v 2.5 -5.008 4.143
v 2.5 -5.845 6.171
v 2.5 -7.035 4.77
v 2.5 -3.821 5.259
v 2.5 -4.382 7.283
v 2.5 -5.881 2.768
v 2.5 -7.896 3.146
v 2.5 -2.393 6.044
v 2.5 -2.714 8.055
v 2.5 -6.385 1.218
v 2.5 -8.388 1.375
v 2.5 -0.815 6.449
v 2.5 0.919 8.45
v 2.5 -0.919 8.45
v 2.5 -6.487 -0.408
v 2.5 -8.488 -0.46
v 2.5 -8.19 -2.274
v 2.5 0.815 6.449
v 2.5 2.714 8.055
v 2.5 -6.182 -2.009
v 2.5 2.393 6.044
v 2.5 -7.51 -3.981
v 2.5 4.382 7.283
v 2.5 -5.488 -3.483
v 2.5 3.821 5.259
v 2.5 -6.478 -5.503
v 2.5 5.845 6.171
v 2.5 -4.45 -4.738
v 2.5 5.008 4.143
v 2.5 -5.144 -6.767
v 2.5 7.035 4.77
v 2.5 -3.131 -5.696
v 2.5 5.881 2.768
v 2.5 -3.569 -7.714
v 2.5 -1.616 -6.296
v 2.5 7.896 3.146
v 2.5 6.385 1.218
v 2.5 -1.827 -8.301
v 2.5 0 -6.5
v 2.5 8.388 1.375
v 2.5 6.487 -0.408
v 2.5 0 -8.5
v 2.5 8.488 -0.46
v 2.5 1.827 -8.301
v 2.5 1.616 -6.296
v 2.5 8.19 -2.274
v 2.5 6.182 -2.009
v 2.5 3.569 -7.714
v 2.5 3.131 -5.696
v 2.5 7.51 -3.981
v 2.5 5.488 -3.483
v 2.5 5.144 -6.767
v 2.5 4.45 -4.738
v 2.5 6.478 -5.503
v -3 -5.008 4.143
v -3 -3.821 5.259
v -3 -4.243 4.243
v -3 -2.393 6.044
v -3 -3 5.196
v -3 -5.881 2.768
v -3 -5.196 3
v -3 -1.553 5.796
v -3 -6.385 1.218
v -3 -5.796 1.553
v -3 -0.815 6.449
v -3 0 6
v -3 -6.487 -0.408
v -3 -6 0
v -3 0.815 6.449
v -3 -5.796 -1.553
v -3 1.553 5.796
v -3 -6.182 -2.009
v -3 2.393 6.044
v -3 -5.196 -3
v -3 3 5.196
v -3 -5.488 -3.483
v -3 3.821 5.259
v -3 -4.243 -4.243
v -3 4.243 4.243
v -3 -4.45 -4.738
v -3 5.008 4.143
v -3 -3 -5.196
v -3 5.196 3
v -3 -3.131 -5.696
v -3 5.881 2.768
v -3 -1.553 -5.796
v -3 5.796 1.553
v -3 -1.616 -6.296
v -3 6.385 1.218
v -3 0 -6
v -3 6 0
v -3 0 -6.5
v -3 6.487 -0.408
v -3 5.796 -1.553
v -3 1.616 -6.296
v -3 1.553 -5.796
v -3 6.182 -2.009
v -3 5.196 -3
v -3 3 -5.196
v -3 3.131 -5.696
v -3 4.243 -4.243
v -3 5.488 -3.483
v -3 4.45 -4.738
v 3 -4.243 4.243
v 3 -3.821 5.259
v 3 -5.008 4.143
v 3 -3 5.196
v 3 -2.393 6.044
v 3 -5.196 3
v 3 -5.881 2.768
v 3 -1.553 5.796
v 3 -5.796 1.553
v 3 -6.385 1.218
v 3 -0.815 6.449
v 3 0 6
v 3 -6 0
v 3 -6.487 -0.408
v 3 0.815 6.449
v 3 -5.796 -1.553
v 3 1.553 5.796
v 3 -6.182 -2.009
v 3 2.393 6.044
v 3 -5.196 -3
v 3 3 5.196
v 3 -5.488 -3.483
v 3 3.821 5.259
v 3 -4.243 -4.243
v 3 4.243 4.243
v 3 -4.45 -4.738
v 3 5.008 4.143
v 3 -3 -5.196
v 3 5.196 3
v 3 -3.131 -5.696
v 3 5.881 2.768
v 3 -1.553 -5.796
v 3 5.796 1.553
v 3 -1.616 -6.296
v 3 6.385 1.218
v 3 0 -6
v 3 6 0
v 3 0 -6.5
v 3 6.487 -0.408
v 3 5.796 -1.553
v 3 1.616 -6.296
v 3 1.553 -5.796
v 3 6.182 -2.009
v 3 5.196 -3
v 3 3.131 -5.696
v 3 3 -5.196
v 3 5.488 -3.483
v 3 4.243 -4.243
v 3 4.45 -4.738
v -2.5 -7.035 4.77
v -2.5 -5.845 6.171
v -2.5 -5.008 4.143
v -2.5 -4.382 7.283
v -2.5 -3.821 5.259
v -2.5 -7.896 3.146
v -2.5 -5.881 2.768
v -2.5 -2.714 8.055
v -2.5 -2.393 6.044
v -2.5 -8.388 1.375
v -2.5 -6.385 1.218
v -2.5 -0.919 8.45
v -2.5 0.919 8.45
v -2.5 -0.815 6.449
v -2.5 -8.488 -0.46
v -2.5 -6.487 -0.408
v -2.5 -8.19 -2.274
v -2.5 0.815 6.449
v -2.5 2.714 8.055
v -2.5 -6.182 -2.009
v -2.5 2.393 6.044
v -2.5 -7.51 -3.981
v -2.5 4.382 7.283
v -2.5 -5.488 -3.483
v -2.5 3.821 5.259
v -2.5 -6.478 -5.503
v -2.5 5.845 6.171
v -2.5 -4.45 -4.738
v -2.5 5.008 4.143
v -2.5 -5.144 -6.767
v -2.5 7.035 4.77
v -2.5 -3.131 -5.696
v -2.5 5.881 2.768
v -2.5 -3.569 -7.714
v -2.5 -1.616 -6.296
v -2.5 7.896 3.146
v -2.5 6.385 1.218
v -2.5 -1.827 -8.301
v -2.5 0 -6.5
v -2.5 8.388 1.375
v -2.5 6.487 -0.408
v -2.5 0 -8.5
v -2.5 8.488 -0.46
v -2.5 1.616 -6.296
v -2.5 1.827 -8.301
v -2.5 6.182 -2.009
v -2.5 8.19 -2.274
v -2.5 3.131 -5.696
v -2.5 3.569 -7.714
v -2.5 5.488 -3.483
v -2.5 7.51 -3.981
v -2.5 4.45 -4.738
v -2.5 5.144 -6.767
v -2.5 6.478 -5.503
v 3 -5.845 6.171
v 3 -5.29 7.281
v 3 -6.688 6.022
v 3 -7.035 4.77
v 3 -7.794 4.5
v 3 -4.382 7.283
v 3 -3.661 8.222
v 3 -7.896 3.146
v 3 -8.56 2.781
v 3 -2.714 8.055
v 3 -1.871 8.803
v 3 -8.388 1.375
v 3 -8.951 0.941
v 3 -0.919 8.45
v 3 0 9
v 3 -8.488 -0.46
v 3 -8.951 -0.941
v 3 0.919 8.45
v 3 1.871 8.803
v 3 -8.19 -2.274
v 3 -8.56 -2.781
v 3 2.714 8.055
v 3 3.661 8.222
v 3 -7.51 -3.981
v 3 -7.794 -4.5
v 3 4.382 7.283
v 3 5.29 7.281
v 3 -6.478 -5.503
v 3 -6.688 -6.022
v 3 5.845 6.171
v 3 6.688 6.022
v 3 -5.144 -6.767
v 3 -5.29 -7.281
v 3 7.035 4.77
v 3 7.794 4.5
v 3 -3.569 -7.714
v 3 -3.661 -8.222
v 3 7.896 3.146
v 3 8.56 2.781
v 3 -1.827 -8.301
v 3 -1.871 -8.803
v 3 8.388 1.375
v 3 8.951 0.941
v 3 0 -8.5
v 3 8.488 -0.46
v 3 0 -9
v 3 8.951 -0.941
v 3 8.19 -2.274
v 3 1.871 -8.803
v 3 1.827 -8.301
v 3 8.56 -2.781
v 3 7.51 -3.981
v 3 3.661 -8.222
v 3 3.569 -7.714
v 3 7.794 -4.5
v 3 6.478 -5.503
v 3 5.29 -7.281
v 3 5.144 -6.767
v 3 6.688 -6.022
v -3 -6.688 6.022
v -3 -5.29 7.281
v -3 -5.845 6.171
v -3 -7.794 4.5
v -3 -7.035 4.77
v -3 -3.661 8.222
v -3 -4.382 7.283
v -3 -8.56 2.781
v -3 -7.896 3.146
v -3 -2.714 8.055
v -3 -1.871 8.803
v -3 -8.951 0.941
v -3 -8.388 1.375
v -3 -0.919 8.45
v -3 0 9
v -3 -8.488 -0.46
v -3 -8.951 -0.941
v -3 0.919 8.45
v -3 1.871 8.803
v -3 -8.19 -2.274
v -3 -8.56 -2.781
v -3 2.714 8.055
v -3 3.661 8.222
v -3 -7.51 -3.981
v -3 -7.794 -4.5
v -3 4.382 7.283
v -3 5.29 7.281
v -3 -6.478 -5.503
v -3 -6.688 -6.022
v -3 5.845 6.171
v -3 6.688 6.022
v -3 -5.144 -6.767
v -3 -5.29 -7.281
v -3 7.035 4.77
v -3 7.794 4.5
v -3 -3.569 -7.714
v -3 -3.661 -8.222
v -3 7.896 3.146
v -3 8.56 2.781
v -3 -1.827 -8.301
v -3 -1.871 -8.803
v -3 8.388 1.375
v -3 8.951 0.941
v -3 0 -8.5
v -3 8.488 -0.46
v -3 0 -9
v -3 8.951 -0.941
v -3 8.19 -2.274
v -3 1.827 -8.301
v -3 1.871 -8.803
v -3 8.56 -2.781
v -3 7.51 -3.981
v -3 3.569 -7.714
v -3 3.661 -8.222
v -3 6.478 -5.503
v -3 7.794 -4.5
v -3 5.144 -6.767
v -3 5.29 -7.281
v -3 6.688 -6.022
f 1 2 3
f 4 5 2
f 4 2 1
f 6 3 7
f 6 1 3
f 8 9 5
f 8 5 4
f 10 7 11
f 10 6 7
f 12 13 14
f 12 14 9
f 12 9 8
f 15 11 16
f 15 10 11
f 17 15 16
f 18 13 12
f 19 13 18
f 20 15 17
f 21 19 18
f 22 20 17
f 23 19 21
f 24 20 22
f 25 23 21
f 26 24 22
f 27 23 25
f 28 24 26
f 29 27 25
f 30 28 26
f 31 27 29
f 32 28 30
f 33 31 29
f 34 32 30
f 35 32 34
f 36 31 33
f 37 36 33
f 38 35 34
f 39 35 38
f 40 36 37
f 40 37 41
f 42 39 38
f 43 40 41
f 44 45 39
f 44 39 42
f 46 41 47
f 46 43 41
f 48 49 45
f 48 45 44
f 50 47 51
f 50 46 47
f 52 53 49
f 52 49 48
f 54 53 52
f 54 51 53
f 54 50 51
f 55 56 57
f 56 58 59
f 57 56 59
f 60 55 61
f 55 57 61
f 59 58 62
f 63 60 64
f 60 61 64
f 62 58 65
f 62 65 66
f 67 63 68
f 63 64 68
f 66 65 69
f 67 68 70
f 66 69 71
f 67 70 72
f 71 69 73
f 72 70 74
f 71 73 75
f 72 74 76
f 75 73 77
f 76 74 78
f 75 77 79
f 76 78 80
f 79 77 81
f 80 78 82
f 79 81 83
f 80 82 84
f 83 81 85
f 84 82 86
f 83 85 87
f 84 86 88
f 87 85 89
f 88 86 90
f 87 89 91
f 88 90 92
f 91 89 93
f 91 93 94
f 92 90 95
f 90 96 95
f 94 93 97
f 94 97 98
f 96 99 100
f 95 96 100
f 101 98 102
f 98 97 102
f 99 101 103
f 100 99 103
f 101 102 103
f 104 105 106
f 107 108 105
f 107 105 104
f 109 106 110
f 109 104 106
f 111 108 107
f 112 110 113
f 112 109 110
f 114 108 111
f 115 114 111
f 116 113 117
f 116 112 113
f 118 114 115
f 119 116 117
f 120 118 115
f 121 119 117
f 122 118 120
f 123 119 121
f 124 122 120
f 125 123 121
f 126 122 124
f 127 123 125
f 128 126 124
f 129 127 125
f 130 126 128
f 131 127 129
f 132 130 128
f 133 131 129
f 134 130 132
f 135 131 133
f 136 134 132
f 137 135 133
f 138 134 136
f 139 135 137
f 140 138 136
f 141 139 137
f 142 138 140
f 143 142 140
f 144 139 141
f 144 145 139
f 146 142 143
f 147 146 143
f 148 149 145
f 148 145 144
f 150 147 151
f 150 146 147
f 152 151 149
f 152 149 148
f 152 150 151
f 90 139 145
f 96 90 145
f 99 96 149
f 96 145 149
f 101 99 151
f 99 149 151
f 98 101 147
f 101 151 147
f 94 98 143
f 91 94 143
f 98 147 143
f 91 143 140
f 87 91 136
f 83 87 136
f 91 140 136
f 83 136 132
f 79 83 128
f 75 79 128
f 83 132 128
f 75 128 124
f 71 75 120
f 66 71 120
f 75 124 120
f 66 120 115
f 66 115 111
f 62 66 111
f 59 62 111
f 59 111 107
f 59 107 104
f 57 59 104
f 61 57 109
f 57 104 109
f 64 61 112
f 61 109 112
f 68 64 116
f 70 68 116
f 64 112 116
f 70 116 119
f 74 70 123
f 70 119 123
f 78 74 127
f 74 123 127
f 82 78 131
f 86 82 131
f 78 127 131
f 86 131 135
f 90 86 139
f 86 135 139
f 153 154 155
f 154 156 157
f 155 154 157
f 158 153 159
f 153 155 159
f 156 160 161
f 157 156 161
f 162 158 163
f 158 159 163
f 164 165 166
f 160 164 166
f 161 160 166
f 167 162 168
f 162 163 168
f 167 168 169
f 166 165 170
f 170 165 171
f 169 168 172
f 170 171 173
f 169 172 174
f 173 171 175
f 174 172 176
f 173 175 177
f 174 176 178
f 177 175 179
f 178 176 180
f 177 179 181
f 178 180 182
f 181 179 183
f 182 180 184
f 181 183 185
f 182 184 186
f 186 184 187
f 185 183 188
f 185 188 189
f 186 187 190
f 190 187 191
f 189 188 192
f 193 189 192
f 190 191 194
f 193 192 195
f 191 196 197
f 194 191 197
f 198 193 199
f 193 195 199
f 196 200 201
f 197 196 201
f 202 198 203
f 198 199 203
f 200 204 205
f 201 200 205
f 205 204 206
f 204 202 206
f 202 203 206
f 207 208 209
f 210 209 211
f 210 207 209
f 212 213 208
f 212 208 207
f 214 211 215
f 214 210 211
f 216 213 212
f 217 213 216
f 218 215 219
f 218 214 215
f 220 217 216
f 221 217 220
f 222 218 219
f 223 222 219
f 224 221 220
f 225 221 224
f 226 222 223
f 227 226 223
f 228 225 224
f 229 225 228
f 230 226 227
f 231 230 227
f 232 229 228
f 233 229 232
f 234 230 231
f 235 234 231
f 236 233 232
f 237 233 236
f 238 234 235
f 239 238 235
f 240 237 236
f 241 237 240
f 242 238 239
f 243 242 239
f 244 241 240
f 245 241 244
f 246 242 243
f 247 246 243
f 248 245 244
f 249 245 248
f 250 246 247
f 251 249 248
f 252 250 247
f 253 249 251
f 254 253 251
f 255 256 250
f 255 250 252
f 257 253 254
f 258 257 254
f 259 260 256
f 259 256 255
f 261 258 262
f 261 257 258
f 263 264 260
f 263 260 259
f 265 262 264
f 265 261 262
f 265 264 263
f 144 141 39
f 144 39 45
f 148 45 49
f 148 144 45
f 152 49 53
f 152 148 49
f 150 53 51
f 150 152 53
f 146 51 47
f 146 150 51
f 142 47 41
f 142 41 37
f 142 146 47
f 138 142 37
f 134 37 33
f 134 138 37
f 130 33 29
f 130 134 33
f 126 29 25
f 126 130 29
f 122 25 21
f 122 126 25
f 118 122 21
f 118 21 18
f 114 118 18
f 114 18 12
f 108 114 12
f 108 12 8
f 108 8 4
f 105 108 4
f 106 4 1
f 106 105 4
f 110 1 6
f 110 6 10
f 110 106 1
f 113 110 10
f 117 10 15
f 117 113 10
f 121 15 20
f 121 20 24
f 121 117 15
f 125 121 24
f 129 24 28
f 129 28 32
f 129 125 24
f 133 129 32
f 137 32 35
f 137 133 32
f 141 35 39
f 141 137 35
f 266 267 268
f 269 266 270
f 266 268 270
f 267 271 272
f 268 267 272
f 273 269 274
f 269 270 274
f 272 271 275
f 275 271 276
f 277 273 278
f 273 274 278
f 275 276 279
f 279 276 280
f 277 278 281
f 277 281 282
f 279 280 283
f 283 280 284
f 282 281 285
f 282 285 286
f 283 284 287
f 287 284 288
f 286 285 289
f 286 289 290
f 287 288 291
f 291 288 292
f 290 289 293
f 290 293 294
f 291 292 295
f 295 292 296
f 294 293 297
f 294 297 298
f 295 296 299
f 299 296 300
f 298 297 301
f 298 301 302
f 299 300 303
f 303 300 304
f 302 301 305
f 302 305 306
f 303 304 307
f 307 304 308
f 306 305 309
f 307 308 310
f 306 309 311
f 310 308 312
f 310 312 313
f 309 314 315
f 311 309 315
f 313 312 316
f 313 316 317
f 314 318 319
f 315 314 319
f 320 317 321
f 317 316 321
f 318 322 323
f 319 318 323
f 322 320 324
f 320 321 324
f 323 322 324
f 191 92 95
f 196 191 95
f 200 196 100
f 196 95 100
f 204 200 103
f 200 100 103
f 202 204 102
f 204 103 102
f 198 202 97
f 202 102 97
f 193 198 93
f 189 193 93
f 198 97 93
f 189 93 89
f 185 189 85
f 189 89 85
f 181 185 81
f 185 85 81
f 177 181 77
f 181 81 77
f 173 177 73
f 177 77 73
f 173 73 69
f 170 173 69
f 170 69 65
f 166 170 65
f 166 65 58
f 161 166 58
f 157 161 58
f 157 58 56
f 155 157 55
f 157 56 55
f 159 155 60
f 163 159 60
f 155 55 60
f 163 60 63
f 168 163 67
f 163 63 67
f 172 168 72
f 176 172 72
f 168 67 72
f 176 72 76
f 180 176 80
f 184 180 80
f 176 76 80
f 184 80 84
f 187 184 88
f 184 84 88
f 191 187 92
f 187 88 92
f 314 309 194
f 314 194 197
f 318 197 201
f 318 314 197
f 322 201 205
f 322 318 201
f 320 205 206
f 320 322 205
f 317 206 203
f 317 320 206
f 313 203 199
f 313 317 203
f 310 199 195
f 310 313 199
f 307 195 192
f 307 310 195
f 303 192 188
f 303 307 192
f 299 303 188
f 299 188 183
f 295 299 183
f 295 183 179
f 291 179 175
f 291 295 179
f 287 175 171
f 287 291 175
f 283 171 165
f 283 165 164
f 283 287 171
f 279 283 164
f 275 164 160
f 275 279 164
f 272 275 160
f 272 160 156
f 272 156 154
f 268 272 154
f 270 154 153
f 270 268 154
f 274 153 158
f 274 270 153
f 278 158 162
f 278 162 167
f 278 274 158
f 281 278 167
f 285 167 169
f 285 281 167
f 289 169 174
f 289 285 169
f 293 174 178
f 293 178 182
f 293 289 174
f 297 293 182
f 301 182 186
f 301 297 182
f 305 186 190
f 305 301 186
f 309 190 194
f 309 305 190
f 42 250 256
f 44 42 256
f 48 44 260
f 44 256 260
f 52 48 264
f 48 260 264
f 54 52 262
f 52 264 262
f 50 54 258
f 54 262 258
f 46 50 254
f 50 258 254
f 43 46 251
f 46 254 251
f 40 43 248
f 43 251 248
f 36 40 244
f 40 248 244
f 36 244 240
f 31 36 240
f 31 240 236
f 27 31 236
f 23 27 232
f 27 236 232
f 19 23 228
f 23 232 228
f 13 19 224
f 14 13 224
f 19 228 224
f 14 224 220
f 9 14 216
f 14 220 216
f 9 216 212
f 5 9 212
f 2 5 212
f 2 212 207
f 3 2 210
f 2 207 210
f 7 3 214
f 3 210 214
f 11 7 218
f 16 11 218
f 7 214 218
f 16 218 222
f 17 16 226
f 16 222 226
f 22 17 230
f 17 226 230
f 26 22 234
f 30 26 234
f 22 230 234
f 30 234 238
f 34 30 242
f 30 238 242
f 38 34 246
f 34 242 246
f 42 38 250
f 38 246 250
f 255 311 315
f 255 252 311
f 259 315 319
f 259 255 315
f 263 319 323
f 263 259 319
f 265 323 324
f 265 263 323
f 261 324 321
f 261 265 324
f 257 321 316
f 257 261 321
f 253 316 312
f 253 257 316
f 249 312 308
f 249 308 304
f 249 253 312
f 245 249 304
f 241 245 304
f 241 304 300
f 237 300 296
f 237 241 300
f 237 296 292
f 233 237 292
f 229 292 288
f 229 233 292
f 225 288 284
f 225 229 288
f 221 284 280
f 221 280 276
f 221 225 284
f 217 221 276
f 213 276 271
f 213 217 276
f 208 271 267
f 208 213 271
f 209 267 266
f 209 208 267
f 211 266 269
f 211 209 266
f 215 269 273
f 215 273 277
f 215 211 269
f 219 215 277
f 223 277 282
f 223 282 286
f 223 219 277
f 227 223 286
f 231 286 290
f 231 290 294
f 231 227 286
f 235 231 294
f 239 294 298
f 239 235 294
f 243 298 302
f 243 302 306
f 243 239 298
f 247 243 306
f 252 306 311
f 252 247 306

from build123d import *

# Parameters (mm, degrees)
SKETCH2_R           = 9
BOSS_EXTRUDE1_DEPTH = 3
SKETCH3_R           = 6
CUT_EXTRUDE1_DEPTH  = 6
SKETCH4_R           = 8.5
SKETCH4_R_2         = 7.5
SKETCH4_R_3         = 6.5
CUT_EXTRUDE2_DEPTH  = 0.5


with BuildPart() as part:
    # Sketch2 → Boss-Extrude1 (new, symmetric)
    with BuildSketch(Plane(origin=(0, 0, 0), x_dir=(0, 0, -1), z_dir=(1, 0, 0))):
        Circle(SKETCH2_R)
    extrude(amount=BOSS_EXTRUDE1_DEPTH, both=True)

    # Sketch3 → Cut-Extrude1 (cut)
    with BuildSketch(Plane(origin=(3, 0, 0), x_dir=(0, 0, -1), z_dir=(1, 0, 0))):
        Circle(SKETCH3_R)
    extrude(amount=-CUT_EXTRUDE1_DEPTH, mode=Mode.SUBTRACT)

    # Sketch4 → Cut-Extrude2 (cut)
    with BuildSketch(Plane(origin=(3, 0, 0), x_dir=(0, 0, -1), z_dir=(1, 0, 0))):
        Circle(SKETCH4_R)
        Circle(SKETCH4_R_2, mode=Mode.SUBTRACT)
        Circle(SKETCH4_R_2)
        Circle(SKETCH4_R_3, mode=Mode.SUBTRACT)
    cut_extrude2 = extrude(amount=-CUT_EXTRUDE2_DEPTH, mode=Mode.SUBTRACT)

    # Mirror1: Cut-Extrude2 across plane
    add(cut_extrude2.mirror(Plane(origin=(0, 0, 0), x_dir=(0, 0, 1), z_dir=(1, 0, 0))), mode=Mode.SUBTRACT)


solid = part.part
